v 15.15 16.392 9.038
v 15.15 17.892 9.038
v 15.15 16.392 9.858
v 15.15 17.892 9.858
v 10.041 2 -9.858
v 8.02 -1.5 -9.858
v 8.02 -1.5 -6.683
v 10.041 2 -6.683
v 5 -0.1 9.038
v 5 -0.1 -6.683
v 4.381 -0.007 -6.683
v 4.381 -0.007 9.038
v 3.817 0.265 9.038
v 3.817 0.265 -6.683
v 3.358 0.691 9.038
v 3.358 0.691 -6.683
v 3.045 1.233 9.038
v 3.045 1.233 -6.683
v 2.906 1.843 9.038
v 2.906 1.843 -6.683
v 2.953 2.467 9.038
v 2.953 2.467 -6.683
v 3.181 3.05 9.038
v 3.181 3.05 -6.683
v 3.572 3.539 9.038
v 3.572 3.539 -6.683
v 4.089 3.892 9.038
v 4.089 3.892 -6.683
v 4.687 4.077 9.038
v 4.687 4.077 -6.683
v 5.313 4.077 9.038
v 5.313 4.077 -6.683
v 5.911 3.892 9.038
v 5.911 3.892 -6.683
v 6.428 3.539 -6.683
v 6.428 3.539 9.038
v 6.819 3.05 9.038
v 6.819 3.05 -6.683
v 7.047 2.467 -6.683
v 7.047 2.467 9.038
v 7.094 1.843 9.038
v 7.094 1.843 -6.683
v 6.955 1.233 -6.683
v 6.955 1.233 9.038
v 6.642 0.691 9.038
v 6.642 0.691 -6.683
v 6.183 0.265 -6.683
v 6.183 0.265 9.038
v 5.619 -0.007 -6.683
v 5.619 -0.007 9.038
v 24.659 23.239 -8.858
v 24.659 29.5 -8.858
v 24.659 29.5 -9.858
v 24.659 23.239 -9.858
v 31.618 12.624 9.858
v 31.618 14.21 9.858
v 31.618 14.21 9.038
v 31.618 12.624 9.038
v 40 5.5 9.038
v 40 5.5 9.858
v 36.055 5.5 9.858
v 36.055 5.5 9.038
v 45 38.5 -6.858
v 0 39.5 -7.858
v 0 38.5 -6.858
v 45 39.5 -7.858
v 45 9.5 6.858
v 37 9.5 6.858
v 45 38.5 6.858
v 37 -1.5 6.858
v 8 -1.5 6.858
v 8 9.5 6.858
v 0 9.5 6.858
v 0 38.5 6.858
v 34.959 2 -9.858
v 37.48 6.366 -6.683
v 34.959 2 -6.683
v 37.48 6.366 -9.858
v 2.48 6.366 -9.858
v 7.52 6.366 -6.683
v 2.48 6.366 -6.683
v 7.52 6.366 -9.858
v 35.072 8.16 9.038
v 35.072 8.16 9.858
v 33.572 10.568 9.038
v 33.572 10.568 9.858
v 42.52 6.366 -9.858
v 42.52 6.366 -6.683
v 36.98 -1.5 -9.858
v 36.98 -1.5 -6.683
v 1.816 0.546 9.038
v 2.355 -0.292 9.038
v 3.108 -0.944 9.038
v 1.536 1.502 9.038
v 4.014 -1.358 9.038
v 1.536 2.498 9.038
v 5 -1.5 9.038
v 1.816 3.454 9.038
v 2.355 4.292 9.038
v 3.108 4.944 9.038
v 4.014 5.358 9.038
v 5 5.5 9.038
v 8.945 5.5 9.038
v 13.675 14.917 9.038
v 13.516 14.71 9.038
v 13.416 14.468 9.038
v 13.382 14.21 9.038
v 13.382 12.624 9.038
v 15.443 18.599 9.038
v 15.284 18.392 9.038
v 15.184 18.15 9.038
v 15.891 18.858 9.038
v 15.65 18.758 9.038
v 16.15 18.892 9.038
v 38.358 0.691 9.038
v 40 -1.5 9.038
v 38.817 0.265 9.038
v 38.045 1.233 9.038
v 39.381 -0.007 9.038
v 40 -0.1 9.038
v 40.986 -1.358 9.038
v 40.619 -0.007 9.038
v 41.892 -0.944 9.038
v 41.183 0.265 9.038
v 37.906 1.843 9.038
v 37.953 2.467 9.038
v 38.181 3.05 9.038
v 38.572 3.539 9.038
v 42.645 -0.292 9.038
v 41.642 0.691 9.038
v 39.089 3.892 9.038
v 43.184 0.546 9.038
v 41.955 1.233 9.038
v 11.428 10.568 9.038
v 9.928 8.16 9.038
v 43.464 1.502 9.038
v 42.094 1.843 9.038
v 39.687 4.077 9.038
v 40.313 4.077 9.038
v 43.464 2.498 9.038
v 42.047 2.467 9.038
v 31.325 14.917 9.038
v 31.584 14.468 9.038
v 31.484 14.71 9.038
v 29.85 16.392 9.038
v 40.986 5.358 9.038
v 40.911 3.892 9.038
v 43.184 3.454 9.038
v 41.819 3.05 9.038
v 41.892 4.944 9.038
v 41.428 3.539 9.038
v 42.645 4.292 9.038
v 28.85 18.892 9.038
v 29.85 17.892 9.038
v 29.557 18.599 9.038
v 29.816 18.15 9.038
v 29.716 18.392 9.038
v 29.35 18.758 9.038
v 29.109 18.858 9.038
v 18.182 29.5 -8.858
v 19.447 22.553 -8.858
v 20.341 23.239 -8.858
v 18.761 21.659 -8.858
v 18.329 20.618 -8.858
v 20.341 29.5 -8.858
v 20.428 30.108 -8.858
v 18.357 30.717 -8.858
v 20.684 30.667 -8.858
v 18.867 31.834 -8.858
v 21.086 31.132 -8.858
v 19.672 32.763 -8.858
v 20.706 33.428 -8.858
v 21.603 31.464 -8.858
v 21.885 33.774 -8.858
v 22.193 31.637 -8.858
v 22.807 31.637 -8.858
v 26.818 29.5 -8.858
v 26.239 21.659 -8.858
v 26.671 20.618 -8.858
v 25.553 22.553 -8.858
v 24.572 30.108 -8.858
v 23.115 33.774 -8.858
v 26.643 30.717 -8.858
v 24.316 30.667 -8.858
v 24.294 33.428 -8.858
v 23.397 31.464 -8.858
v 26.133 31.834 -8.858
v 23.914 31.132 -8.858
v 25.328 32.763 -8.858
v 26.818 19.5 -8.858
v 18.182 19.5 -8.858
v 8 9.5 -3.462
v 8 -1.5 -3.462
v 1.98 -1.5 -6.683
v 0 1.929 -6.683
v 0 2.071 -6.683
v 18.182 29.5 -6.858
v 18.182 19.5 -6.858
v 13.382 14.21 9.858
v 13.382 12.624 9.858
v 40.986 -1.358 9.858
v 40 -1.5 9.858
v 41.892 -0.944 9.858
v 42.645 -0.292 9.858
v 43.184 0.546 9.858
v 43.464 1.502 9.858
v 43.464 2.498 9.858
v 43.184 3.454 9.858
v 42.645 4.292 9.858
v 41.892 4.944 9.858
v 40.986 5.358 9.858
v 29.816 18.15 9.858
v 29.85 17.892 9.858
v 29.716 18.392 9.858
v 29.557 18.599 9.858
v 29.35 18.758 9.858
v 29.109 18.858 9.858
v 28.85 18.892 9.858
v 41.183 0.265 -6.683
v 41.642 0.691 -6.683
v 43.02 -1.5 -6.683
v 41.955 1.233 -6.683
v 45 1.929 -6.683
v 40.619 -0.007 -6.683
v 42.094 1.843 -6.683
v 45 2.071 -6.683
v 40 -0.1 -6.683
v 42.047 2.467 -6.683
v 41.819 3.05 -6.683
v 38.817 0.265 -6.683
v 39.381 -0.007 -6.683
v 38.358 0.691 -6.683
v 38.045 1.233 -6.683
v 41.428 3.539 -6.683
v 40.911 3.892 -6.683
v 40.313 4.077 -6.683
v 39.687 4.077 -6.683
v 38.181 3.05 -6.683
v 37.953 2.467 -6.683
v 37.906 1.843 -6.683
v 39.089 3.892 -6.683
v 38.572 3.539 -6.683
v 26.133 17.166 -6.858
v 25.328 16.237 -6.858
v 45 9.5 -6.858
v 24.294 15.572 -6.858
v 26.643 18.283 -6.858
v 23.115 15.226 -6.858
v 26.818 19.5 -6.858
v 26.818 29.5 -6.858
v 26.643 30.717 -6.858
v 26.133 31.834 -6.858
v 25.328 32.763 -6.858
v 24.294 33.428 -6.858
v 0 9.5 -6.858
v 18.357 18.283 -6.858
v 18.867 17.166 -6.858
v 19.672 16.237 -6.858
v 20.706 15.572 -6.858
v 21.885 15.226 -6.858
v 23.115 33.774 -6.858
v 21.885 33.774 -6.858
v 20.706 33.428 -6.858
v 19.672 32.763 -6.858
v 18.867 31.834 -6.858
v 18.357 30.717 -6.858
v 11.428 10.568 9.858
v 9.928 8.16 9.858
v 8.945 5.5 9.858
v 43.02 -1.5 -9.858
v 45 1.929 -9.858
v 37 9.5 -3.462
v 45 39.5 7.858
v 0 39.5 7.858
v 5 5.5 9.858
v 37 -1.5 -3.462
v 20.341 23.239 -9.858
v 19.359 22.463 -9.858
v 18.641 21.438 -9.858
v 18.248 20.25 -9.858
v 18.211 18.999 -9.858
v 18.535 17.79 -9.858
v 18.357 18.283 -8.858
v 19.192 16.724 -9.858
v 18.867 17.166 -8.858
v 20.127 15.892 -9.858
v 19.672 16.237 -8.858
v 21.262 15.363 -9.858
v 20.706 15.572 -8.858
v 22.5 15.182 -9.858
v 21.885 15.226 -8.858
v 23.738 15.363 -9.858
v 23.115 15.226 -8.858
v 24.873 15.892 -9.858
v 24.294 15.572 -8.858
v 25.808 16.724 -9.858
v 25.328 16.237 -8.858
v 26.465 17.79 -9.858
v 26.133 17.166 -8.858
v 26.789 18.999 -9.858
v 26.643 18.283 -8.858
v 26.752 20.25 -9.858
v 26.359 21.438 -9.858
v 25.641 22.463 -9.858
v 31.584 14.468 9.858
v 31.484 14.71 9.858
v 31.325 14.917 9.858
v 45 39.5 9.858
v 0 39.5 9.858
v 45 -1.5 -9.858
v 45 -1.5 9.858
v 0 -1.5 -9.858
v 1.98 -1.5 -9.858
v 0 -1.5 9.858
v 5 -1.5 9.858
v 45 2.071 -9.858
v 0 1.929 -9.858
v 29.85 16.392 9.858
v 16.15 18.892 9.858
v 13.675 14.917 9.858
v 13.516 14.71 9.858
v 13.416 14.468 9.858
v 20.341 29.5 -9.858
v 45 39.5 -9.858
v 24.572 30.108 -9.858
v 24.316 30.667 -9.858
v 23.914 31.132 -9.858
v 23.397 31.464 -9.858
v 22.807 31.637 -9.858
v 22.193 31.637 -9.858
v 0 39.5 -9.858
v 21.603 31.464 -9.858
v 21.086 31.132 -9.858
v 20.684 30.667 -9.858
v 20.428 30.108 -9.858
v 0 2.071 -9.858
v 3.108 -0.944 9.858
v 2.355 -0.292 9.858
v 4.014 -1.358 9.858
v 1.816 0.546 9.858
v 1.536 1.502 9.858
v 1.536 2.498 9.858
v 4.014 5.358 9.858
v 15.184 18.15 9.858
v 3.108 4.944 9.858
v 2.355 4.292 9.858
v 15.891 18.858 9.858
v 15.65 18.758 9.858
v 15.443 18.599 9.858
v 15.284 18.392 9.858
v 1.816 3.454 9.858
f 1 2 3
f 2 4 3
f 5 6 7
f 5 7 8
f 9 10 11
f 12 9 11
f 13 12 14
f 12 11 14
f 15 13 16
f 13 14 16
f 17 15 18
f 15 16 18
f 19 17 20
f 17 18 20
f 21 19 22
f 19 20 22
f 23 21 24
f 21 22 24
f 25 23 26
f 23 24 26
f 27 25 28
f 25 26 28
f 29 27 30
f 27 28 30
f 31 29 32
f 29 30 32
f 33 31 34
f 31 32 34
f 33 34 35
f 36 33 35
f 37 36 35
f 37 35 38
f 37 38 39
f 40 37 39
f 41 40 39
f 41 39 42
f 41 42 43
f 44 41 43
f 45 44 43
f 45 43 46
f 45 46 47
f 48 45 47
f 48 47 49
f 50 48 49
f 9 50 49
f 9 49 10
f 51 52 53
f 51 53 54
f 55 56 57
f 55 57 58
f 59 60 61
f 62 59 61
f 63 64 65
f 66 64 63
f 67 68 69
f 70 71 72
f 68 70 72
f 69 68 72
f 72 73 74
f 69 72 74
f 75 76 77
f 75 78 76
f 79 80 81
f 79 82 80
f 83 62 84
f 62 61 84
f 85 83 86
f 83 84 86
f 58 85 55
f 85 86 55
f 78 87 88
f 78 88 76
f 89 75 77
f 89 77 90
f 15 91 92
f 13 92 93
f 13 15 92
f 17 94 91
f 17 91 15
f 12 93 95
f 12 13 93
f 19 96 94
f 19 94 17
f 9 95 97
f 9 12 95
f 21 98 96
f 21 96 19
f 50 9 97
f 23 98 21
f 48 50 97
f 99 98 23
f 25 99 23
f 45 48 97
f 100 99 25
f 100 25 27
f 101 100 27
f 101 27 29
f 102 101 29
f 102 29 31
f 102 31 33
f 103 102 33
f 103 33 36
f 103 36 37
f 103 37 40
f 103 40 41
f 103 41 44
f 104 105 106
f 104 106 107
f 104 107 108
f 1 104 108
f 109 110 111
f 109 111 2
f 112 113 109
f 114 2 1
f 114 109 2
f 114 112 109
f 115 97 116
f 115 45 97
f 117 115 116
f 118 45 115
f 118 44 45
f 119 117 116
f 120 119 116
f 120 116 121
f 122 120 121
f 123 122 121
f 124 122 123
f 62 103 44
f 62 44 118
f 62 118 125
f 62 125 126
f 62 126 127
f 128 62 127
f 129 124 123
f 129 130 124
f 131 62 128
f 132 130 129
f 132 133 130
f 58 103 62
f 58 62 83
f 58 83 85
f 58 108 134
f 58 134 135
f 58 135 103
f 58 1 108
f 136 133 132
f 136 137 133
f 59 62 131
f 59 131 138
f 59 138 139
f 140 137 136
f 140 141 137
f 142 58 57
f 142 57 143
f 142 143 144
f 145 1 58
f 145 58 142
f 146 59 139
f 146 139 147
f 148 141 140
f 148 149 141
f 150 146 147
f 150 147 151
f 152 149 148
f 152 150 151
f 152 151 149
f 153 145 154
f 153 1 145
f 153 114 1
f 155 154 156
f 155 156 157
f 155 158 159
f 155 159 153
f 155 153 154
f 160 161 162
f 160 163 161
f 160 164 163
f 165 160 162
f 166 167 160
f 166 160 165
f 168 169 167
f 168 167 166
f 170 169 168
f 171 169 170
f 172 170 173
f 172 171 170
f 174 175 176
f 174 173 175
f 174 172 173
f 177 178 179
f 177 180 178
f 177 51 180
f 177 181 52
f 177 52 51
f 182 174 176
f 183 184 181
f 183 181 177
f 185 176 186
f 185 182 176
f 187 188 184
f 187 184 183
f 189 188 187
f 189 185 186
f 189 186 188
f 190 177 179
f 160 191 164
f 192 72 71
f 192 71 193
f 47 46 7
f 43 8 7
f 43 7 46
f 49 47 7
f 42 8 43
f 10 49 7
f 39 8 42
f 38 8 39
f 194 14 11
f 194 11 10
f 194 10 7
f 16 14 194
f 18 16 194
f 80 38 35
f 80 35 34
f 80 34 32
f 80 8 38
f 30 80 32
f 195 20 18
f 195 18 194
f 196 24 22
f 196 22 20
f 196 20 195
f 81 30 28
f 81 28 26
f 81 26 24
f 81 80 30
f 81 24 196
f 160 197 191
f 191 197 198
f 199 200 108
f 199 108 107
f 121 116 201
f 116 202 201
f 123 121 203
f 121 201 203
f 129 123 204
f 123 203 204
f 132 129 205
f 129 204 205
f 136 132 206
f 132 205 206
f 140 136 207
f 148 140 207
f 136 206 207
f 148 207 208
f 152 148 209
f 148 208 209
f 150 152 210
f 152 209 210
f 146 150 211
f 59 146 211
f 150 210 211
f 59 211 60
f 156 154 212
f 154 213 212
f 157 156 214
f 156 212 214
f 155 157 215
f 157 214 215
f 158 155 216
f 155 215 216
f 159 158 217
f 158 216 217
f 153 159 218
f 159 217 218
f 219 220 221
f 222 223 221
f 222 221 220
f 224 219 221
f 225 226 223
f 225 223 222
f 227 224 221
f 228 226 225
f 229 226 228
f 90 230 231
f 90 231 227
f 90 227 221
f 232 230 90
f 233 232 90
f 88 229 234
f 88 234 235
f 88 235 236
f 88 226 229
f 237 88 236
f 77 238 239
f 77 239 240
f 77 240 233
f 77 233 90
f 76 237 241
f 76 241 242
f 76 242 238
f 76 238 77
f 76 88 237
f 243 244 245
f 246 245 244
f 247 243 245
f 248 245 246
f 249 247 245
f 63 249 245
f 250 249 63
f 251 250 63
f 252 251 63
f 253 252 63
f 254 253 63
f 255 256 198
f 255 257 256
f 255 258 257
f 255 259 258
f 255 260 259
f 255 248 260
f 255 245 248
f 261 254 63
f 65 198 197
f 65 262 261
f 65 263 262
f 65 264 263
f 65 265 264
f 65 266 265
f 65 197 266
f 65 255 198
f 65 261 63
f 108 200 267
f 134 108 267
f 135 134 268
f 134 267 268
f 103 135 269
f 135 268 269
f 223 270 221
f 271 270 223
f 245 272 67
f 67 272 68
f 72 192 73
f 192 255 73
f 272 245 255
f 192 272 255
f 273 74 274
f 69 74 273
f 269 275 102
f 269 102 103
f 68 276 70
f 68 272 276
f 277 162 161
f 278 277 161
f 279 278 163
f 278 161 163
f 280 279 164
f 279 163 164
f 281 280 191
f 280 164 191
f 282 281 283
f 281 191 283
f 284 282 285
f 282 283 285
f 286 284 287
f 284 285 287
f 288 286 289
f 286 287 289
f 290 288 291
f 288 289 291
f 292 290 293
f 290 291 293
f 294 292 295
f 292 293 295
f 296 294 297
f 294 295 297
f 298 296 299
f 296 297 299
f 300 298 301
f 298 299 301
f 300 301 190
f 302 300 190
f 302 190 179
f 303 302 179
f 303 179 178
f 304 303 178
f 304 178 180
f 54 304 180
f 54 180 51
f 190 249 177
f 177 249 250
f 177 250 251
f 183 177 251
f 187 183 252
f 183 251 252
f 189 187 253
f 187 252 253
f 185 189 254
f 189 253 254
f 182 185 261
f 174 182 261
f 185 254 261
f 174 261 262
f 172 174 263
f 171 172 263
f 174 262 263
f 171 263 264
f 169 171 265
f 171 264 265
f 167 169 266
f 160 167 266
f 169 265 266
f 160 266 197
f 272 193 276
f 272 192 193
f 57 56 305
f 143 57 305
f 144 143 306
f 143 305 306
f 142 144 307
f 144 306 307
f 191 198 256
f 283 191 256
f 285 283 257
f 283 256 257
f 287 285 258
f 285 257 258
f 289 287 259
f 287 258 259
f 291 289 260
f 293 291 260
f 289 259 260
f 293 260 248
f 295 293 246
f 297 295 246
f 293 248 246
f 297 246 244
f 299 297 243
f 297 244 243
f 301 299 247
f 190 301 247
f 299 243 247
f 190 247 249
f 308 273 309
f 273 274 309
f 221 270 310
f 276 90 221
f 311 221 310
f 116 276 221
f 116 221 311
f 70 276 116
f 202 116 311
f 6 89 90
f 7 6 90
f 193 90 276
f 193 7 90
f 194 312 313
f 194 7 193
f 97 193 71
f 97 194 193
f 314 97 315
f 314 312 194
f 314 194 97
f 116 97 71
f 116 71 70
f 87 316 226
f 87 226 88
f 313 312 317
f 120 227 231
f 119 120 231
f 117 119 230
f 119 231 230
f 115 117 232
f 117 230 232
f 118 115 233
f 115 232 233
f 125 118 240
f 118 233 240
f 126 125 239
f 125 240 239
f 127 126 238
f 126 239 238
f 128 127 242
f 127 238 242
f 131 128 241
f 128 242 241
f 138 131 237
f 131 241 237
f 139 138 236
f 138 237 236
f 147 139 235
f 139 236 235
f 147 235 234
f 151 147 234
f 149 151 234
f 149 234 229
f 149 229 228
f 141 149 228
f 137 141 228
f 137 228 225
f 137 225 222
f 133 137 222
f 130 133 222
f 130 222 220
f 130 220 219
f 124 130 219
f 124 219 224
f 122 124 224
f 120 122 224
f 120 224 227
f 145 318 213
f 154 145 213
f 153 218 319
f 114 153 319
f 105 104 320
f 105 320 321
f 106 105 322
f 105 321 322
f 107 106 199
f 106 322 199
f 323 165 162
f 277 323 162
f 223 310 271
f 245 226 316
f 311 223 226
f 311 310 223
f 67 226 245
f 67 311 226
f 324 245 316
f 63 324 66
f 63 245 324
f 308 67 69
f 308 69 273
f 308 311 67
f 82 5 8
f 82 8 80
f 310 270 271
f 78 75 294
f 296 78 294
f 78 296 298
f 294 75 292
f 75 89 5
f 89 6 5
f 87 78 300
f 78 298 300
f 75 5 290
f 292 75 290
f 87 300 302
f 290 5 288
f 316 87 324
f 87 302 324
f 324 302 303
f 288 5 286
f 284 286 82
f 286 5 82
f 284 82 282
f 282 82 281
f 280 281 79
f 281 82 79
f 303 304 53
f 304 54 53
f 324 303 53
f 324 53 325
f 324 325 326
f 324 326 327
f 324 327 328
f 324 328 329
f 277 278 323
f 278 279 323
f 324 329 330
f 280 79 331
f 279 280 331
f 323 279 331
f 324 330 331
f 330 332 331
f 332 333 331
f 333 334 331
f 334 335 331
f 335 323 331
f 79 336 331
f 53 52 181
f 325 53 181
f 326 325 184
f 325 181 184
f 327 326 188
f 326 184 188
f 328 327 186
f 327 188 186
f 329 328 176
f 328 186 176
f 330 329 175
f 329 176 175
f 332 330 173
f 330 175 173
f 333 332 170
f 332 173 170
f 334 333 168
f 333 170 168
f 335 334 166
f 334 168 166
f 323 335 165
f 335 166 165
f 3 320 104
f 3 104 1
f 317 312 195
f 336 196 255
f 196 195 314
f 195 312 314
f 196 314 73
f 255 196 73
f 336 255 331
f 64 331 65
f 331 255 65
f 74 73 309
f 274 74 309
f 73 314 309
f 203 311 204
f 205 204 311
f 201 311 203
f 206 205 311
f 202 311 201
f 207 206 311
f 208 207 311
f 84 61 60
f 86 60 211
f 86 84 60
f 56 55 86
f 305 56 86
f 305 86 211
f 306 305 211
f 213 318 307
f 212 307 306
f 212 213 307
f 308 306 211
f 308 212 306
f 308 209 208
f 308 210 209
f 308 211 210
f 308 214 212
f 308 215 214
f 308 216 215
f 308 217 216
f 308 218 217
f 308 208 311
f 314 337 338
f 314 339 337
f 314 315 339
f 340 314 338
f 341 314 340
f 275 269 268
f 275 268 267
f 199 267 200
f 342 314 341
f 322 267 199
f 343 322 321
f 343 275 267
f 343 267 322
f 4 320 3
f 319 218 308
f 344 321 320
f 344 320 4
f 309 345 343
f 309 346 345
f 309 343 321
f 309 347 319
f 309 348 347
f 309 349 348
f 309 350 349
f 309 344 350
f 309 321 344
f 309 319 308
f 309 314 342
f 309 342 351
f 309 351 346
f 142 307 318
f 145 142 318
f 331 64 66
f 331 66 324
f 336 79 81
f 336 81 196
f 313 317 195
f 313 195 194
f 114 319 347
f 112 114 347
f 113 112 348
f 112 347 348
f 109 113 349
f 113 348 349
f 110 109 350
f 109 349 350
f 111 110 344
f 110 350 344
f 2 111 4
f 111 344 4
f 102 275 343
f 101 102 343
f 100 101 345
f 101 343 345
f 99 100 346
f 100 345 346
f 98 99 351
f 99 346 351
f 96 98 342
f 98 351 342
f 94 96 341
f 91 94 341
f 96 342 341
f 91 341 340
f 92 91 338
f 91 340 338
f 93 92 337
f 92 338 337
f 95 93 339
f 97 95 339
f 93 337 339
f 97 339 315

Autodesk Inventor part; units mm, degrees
ref_plane "YZ Plane" through (0, 0, 0) normal (1, 0, 0) x (0, 1, 0)
ref_plane "XZ Plane" through (0, 0, 0) normal (0, 1, 0) x (-1, 0, 0)
ref_plane "XY Plane" through (0, 0, 0) normal (0, 0, 1) x (1, 0, 0)
sketch "Sketch1" plane through (0, 0, 0) normal (1, 0, 0) x (0, 1, 0)
  line L0 (-1.5, 6.858) -> (1.5, 6.858)
  line L1 (1.5, 6.858) -> (1.5, -6.858)
  line L2 (1.5, -6.858) -> (-1.5, -6.858)
  line L3 (-1.5, -6.858) -> (-1.5, 6.858)
  line L4 (-1.5, 6.858) -> (1.5, -6.858) construction
  line L5 (1.5, 6.858) -> (-1.5, -6.858) construction
  line L6 (1.5, 6.858) -> (39.5, 6.858)
  line L7 (39.5, 6.858) -> (39.5, 9.858)
  line L8 (39.5, 9.858) -> (1.5, 9.858)
  line L9 (1.5, 9.858) -> (1.5, 6.858)
  line L10 (1.5, -6.858) -> (39.5, -6.858)
  line L11 (39.5, -6.858) -> (39.5, -9.858)
  line L12 (39.5, -9.858) -> (1.5, -9.858)
  line L13 (1.5, -9.858) -> (1.5, -6.858)
  line L14 (9.5, 6.858) -> (1.5, 6.858)
  line L15 (1.5, 6.858) -> (1.5, -0.142)
  line L16 (1.5, -0.142) -> (9.5, -0.142)
  line L17 (9.5, -0.142) -> (9.5, 6.858)
  line L18 (9.5, -6.858) -> (1.5, -6.858)
  line L19 (1.5, -6.858) -> (1.5, -0.142)
  line L20 (1.5, -0.142) -> (9.5, -0.142)
  line L21 (9.5, -0.142) -> (9.5, -6.858)
  line L22 (9.5, -0.142) -> (1.5, -0.142)
  line L23 (1.5, 6.858) -> (-1.5, 6.858)
  line L24 (-1.5, 6.858) -> (-1.5, 9.858)
  line L25 (-1.5, 9.858) -> (1.5, 9.858)
  line L26 (1.5, 9.858) -> (1.5, 6.858)
  line L27 (1.5, -6.858) -> (-1.5, -6.858)
  line L28 (-1.5, -6.858) -> (-1.5, -9.858)
  line L29 (-1.5, -9.858) -> (1.5, -9.858)
  line L30 (1.5, -9.858) -> (1.5, -6.858)
  point P0 (0, 0)
  dimension "d0" = 3
  dimension "d2" = 13.716
  dimension "d3" = 3
  dimension "d4" = 3
  dimension "d5" = 38
  dimension "d6" = 38
  dimension "d7" = 0
  dimension "d8" = 8
  dimension "d9" = 8
  dimension "d12" = 7
  dimension "d13" = 6.716
extrude "Extrusion1" add sketch "Sketch1" along normal blind 45
sketch "Sketch2" plane through (0, -1.5, 9.858) normal (0, 0, 1) x (1, 0, 0)
  line L0 (5, 7) -> (8.9446, 7) projected
  arc A0 (5, 7) -> (5, 0) centre (5, 3.5) ccw projected
  line L1 (8.9446, 0) -> (5, 0) projected
  arc A1 (13.3822, 14.1239) -> (31.6178, 14.1239) centre (22.5, 3.5) ccw projected
  line L2 (13.3822, 14.1239) -> (13.3822, 15.7096) projected
  line L3 (13.6751, 16.4167) -> (15.15, 17.8916) projected
  arc A2 (13.6751, 16.4167) -> (13.3822, 15.7096) centre (14.3822, 15.7096) ccw projected
  arc A3 (16.15, 20.3916) -> (15.15, 19.3916) centre (16.15, 19.3916) ccw projected
  line L4 (15.15, 19.3916) -> (15.15, 17.8916) projected
  line L5 (28.85, 20.3916) -> (16.15, 20.3916) projected
  arc A4 (29.85, 19.3916) -> (28.85, 20.3916) centre (28.85, 19.3916) ccw projected
  line L6 (29.85, 17.8916) -> (29.85, 19.3916) projected
  line L7 (31.3249, 16.4167) -> (29.85, 17.8916) projected
  line L8 (31.6178, 15.7096) -> (31.6178, 14.1239) projected
  arc A5 (31.6178, 15.7096) -> (31.3249, 16.4167) centre (30.6178, 15.7096) ccw projected
  line L9 (40, 7) -> (36.0554, 7) projected
  arc A6 (40, 0) -> (40, 7) centre (40, 3.5) ccw projected
  line L10 (36.0554, 0) -> (40, 0) projected
  line L11 (40, 7) -> (36.0554, 7) projected
  arc A7 (40, 0) -> (40, 7) centre (40, 3.5) ccw projected
  line L12 (36.0554, 0) -> (40, 0) projected
  line L13 (8.9446, 0) -> (5, 0) projected
  line L14 (36.0554, 0) -> (40, 0) projected
  line L15 (0, 41) -> (0, 0) projected
  line L16 (0, 0) -> (45, 0) projected
  line L17 (45, 41) -> (45, 0) projected
  line L18 (0, 41) -> (45, 41) projected
  line L19 (5, 7) -> (8.9446, 7) projected
  arc A8 (5, 7) -> (5, 0) centre (5, 3.5) ccw projected
sketch "Sketch3" plane through (0, -1.5, 9.858) normal (0, 0, 1) x (1, 0, 0)
  line L0 (0, 0) -> (45, 0) projected
  line L1 (45, 41) -> (45, 0) projected
  point P0 (0, 41)
  point P1 (0, 1.5)
  point P2 (5, 3.5)
  point P3 (40, 3.5)
  dimension "d16" = 35
  dimension "d18" = 5
  dimension "d19" = 45
  dimension "d20" = 3.5
  dimension "d21" = 3.5
hole "Hole1" at (5, 2, 9.858) at (40, 2, 9.858) direction (0, 0, -1) diameter 4.2 end through all
extrude "Extrusion2" cut sketch "Sketch2" against normal blind 0.82 contours A1 L2 A2 L3 L4 A3 L5 A4 L6 L7 A5 L8 L16 | L16 A1
sketch "Sketch4" plane through (0, -1.5, 9.858) normal (0, 0, 1) x (1, 0, 0)
  arc A0 (36.0554, 0) -> (31.6178, 14.1239) centre (22.5, 3.5) ccw projected
  line L0 (36.0554, 0) -> (45, 0) projected
  arc A1 (13.3822, 14.1239) -> (8.9446, 0) centre (22.5, 3.5) ccw projected
  circle A2 centre (5, 3.5) radius 2.1 projected
  circle A3 centre (40, 3.5) radius 2.1 projected
  arc A4 (5, 7) -> (5, 0) centre (5, 3.5) ccw projected
  line L1 (5, 7) -> (8.9446, 7) projected
  line L2 (8.9446, 0) -> (5, 0) projected
  arc A5 (13.3822, 14.1239) -> (31.6178, 14.1239) centre (22.5, 3.5) ccw projected
  arc A6 (13.3822, 14.1239) -> (31.6178, 14.1239) centre (22.5, 3.5) ccw projected
  line L3 (40, 7) -> (36.0554, 7) projected
  arc A7 (40, 0) -> (40, 7) centre (40, 3.5) ccw projected
  line L4 (36.0554, 0) -> (40, 0) projected
  point P0 (0, 1.5)
extrude "Extrusion3" cut sketch "Sketch4" against normal blind 0.82
sketch "Sketch5" plane through (0, -1.5, -9.858) normal (0, 0, -1) x (-1, 0, 0)
  circle A0 centre (-5, 3.5) radius 2.1 projected
  circle A1 centre (-40, 3.5) radius 2.1 projected
  line L0 (-34.959, 3.5) -> (-37.4795, -0.8656)
  line L1 (-37.4795, -0.8656) -> (-42.5205, -0.8656)
  line L2 (-42.5205, -0.8656) -> (-45.041, 3.5)
  line L3 (-45.041, 3.5) -> (-42.5205, 7.8656)
  line L4 (-42.5205, 7.8656) -> (-37.4795, 7.8656)
  line L5 (-37.4795, 7.8656) -> (-34.959, 3.5)
  line L6 (0.041, 3.5) -> (-2.4795, -0.8656)
  line L7 (-2.4795, -0.8656) -> (-7.5205, -0.8656)
  line L8 (-7.5205, -0.8656) -> (-10.041, 3.5)
  line L9 (-10.041, 3.5) -> (-7.5205, 7.8656)
  line L10 (-7.5205, 7.8656) -> (-2.4795, 7.8656)
  line L11 (-2.4795, 7.8656) -> (0.041, 3.5)
  point P0 (0, 1.5)
  point P1 (-40, 3.5)
  point P2 (-5, 3.5)
  dimension "d33" = 8.7312
  dimension "d34" = 8.7312
extrude "Extrusion4" cut sketch "Sketch5" against normal blind 3.175
sketch "Sketch6" plane through (0, 9.5, 6.858) normal (0, 1, 0) x (1, 0, 0)
  line L0 (7.5, 1.82) -> (37.5, 1.82) projected
  line L1 (37.5, 9.82) -> (7.5, 9.82) projected
  line L2 (7.5, 1.82) -> (7.5, 9.82)
  line L3 (37.5, 1.82) -> (37.5, 9.82)
  line L4 (7, 10.32) -> (38, 10.32)
  line L5 (38, 10.32) -> (38, 1.32)
  line L6 (38, 1.32) -> (7, 1.32)
  line L7 (7, 1.32) -> (7, 10.32)
  line L8 (8, 10.32) -> (37, 10.32)
  line L9 (37, 10.32) -> (37, 1.32)
  line L10 (37, 1.32) -> (8, 1.32)
  line L11 (8, 1.32) -> (8, 10.32)
  line L12 (0, 0) -> (45, 0) projected
  line L13 (8, 1.32) -> (37, 1.32)
  line L14 (37, 1.32) -> (37, 0)
  line L15 (37, 0) -> (8, 0)
  line L16 (8, 0) -> (8, 1.32)
  point P0 (0, 6.858)
  dimension "d37" = 0.5
  dimension "d56" = 1
  dimension "d57" = 1
chamfer "Chamfer1" distance 1 angle 45 2 edges at (22.5, 39.5, -6.858) (22.5, 39.5, 6.858)
sketch "Sketch7" plane through (0, 9.5, -6.858) normal (0, 0, 1) x (1, 0, 0)
  line L0 (0, 29) -> (0, 0) projected
  line L1 (0, 0) -> (45, 0) projected
  line L2 (45, 29) -> (45, 0) projected
  circle A0 centre (22.5, 10) radius 4.318
  line L3 (22.5, 10) -> (22.5, 20)
  circle A1 centre (22.5, 20) radius 2.159
  line L4 (20.341, 20) -> (20.341, 6.2605)
  line L5 (24.659, 20) -> (24.659, 6.2605)
  point P0 (0, -9.5)
  dimension "d43" = 8.636
  dimension "d45" = 10
  dimension "d46" = 4.318
  dimension "d47" = 22.5
  dimension "d48" = 45
  dimension "d49" = 10
extrude "Extrusion6" cut sketch "Sketch7" against normal through all
sketch "Sketch8" plane through (0, 9.5, -6.858) normal (0, 0, 1) x (1, 0, 0)
  arc A0 (20.341, 13.7395) -> (24.659, 13.7395) centre (22.5, 10) ccw projected
  line L0 (20.341, 13.7395) -> (20.341, 20) projected
  arc A1 (24.659, 20) -> (20.341, 20) centre (22.5, 20) ccw projected
  line L1 (24.659, 20) -> (24.659, 13.7395) projected
  line L2 (45, 29) -> (45, 0) projected
  circle A2 centre (22.5, 20) radius 4.318
  line L3 (18.182, 20) -> (18.182, 10)
  line L4 (26.818, 10) -> (26.818, 20)
  point P0 (0, -9.5)
  dimension "d52" = 4.318
  dimension "d53" = 8.636
extrude "Extrusion7" cut sketch "Sketch8" against normal blind 2 contours L0 A2 L1 A0 | A0 L3 A2 L0 | A2 L1 A1 L0 | A0 L1 A2 L4 picked at (24.9024, 17.6839)
extrude "Extrusion8" cut sketch "Sketch6" against normal through all contours L11 L1 L9 L0 | L0 L9 L6 L11 | L6 L14 L12 L16 | L11 L4 L9 L1
equation "\"d2\" = StretcherDepth"
equation "\"d6\" = d5"
equation "\"d9\" = d8"
equation "\"d18\" = -0.5 * d16 + 0.5 * d19"
equation "\"d47\" = 0.5 * d48"
equation "\"d53\" = 2 * d52"
equation "\"StretcherDepth\" = 13.716"
properties part number "MotorClipV2" material "ABS Plastic"
